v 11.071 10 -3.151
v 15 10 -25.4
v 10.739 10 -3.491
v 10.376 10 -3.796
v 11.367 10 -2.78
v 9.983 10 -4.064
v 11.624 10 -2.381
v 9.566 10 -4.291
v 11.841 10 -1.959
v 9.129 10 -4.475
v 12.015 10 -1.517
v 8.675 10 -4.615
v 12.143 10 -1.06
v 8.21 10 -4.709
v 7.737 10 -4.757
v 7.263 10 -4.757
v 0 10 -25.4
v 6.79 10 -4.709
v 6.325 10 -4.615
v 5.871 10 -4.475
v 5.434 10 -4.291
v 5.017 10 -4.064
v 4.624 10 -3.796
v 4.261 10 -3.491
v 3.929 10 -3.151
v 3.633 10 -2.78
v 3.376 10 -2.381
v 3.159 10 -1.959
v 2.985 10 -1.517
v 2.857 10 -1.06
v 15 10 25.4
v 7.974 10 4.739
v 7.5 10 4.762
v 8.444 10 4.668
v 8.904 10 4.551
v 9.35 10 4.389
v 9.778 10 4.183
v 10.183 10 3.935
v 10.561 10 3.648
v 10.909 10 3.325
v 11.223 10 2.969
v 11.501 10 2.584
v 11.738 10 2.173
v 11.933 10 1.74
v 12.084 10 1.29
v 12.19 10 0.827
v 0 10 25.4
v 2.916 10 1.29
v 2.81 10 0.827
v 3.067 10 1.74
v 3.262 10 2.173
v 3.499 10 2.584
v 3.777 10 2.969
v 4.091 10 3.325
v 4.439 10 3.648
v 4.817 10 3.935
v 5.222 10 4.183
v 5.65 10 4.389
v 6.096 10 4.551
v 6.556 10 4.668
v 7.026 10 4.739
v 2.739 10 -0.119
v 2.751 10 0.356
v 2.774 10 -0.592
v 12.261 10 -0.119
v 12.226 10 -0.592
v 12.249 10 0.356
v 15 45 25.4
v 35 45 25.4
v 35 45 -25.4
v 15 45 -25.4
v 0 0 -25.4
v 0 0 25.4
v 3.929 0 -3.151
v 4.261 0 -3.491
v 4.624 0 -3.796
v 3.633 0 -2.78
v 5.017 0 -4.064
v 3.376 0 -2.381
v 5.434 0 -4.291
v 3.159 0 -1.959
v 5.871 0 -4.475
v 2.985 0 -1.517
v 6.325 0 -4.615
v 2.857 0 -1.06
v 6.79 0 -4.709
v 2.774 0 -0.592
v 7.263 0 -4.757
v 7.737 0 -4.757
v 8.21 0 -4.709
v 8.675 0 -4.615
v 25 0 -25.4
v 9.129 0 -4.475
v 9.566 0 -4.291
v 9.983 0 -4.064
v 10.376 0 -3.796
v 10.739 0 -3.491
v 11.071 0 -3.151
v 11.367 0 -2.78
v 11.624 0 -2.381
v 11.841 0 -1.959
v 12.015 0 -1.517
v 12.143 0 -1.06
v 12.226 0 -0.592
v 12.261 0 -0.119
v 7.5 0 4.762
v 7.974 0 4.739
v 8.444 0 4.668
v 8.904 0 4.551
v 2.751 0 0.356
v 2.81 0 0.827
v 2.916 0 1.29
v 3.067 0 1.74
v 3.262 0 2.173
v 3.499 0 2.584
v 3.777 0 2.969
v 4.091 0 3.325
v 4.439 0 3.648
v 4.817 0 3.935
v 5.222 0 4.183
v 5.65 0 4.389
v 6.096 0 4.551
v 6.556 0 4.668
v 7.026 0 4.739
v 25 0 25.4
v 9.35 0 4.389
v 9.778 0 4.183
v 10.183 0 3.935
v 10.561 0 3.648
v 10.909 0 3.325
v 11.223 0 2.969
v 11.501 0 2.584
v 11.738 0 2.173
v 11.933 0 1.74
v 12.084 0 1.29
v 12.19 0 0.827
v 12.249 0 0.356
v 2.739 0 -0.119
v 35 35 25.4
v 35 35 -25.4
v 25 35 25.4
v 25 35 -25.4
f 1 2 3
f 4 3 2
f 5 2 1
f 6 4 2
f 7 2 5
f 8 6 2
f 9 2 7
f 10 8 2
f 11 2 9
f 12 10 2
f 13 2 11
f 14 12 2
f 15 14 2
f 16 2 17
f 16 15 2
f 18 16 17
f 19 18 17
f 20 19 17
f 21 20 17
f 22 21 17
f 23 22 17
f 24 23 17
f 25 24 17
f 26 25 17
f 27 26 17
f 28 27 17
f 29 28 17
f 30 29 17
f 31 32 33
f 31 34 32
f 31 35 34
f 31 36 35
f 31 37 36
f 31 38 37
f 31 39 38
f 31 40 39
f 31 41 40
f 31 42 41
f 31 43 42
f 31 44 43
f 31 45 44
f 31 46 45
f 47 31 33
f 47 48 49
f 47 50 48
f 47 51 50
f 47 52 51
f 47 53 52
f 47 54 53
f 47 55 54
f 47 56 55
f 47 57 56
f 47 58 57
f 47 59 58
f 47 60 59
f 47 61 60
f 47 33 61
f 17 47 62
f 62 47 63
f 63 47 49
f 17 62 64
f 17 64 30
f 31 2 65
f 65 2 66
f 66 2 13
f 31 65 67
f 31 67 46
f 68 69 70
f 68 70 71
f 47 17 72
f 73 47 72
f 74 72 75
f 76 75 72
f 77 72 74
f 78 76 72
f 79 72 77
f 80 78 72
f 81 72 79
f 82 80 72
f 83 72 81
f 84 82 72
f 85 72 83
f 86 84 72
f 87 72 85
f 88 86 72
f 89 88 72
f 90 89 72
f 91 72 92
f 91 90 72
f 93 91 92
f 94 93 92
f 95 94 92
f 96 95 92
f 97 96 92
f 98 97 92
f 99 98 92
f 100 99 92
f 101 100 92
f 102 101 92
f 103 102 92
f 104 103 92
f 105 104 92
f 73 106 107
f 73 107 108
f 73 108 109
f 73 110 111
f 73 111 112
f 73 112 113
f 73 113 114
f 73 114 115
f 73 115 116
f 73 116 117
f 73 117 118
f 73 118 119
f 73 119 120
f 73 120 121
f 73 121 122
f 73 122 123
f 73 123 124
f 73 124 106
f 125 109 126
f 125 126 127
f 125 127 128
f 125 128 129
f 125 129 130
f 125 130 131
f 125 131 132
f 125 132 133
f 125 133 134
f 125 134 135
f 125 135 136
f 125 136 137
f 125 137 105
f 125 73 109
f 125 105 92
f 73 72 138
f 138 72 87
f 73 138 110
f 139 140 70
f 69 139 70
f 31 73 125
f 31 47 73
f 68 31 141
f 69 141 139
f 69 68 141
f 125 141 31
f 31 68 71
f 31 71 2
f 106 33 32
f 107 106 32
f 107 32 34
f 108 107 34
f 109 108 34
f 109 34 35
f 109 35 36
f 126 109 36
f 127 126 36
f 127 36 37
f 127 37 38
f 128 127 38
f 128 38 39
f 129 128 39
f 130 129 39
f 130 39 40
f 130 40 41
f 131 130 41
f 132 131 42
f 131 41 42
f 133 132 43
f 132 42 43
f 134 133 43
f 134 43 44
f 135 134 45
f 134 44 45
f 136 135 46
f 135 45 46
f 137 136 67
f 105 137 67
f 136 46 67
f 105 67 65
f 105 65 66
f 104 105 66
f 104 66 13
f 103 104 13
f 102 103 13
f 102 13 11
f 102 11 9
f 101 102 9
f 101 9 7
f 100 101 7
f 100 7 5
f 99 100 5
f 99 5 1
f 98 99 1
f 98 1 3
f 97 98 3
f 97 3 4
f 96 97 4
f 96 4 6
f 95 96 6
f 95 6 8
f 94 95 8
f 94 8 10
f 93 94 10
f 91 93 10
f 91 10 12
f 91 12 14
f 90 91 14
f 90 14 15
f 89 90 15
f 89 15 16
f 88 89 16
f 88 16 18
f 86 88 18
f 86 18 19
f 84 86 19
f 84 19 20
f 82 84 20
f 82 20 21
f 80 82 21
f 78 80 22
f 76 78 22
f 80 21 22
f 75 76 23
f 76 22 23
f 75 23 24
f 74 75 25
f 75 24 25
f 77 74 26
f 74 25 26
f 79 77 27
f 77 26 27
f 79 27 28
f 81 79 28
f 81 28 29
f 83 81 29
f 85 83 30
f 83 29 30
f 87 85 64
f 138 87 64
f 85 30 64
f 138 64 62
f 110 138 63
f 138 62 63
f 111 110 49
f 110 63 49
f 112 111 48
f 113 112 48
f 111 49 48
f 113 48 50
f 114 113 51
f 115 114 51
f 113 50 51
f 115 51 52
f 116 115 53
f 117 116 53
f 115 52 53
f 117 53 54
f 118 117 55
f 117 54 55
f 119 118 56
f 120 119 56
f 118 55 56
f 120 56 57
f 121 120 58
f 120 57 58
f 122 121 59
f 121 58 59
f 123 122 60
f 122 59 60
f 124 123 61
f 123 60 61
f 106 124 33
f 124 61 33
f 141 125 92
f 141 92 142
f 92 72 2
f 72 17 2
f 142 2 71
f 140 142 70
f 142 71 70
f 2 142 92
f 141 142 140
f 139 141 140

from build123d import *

# Parameters (mm, degrees)
EXTRUIR_L_MINA1_DEPTH = 25.4
CROQUIS2_R            = 4.7625
CORTAR_EXTRUIR1_DEPTH = 56.634162167


with BuildPart() as part:
    # Croquis1 → Extruir-Lámina1 (new, symmetric)
    with BuildSketch(Plane.XY):
        Polygon((0, 0), (25, 0), (25, 35), (35, 35), (35, 45), (15, 45), (15, 10), (0, 10), align=None)
    extrude(amount=EXTRUIR_L_MINA1_DEPTH, both=True)

    # Croquis2 → Cortar-Extruir1 (cut, through all)
    with BuildSketch(Plane(origin=(0, 10, 0), x_dir=(1, 0, 0), z_dir=(0, 1, 0))):
        with Locations(Location((7.5, 0, 0), (0, 0, 270))):
            Circle(CROQUIS2_R)
    extrude(amount=-CORTAR_EXTRUIR1_DEPTH, mode=Mode.SUBTRACT)


solid = part.part
